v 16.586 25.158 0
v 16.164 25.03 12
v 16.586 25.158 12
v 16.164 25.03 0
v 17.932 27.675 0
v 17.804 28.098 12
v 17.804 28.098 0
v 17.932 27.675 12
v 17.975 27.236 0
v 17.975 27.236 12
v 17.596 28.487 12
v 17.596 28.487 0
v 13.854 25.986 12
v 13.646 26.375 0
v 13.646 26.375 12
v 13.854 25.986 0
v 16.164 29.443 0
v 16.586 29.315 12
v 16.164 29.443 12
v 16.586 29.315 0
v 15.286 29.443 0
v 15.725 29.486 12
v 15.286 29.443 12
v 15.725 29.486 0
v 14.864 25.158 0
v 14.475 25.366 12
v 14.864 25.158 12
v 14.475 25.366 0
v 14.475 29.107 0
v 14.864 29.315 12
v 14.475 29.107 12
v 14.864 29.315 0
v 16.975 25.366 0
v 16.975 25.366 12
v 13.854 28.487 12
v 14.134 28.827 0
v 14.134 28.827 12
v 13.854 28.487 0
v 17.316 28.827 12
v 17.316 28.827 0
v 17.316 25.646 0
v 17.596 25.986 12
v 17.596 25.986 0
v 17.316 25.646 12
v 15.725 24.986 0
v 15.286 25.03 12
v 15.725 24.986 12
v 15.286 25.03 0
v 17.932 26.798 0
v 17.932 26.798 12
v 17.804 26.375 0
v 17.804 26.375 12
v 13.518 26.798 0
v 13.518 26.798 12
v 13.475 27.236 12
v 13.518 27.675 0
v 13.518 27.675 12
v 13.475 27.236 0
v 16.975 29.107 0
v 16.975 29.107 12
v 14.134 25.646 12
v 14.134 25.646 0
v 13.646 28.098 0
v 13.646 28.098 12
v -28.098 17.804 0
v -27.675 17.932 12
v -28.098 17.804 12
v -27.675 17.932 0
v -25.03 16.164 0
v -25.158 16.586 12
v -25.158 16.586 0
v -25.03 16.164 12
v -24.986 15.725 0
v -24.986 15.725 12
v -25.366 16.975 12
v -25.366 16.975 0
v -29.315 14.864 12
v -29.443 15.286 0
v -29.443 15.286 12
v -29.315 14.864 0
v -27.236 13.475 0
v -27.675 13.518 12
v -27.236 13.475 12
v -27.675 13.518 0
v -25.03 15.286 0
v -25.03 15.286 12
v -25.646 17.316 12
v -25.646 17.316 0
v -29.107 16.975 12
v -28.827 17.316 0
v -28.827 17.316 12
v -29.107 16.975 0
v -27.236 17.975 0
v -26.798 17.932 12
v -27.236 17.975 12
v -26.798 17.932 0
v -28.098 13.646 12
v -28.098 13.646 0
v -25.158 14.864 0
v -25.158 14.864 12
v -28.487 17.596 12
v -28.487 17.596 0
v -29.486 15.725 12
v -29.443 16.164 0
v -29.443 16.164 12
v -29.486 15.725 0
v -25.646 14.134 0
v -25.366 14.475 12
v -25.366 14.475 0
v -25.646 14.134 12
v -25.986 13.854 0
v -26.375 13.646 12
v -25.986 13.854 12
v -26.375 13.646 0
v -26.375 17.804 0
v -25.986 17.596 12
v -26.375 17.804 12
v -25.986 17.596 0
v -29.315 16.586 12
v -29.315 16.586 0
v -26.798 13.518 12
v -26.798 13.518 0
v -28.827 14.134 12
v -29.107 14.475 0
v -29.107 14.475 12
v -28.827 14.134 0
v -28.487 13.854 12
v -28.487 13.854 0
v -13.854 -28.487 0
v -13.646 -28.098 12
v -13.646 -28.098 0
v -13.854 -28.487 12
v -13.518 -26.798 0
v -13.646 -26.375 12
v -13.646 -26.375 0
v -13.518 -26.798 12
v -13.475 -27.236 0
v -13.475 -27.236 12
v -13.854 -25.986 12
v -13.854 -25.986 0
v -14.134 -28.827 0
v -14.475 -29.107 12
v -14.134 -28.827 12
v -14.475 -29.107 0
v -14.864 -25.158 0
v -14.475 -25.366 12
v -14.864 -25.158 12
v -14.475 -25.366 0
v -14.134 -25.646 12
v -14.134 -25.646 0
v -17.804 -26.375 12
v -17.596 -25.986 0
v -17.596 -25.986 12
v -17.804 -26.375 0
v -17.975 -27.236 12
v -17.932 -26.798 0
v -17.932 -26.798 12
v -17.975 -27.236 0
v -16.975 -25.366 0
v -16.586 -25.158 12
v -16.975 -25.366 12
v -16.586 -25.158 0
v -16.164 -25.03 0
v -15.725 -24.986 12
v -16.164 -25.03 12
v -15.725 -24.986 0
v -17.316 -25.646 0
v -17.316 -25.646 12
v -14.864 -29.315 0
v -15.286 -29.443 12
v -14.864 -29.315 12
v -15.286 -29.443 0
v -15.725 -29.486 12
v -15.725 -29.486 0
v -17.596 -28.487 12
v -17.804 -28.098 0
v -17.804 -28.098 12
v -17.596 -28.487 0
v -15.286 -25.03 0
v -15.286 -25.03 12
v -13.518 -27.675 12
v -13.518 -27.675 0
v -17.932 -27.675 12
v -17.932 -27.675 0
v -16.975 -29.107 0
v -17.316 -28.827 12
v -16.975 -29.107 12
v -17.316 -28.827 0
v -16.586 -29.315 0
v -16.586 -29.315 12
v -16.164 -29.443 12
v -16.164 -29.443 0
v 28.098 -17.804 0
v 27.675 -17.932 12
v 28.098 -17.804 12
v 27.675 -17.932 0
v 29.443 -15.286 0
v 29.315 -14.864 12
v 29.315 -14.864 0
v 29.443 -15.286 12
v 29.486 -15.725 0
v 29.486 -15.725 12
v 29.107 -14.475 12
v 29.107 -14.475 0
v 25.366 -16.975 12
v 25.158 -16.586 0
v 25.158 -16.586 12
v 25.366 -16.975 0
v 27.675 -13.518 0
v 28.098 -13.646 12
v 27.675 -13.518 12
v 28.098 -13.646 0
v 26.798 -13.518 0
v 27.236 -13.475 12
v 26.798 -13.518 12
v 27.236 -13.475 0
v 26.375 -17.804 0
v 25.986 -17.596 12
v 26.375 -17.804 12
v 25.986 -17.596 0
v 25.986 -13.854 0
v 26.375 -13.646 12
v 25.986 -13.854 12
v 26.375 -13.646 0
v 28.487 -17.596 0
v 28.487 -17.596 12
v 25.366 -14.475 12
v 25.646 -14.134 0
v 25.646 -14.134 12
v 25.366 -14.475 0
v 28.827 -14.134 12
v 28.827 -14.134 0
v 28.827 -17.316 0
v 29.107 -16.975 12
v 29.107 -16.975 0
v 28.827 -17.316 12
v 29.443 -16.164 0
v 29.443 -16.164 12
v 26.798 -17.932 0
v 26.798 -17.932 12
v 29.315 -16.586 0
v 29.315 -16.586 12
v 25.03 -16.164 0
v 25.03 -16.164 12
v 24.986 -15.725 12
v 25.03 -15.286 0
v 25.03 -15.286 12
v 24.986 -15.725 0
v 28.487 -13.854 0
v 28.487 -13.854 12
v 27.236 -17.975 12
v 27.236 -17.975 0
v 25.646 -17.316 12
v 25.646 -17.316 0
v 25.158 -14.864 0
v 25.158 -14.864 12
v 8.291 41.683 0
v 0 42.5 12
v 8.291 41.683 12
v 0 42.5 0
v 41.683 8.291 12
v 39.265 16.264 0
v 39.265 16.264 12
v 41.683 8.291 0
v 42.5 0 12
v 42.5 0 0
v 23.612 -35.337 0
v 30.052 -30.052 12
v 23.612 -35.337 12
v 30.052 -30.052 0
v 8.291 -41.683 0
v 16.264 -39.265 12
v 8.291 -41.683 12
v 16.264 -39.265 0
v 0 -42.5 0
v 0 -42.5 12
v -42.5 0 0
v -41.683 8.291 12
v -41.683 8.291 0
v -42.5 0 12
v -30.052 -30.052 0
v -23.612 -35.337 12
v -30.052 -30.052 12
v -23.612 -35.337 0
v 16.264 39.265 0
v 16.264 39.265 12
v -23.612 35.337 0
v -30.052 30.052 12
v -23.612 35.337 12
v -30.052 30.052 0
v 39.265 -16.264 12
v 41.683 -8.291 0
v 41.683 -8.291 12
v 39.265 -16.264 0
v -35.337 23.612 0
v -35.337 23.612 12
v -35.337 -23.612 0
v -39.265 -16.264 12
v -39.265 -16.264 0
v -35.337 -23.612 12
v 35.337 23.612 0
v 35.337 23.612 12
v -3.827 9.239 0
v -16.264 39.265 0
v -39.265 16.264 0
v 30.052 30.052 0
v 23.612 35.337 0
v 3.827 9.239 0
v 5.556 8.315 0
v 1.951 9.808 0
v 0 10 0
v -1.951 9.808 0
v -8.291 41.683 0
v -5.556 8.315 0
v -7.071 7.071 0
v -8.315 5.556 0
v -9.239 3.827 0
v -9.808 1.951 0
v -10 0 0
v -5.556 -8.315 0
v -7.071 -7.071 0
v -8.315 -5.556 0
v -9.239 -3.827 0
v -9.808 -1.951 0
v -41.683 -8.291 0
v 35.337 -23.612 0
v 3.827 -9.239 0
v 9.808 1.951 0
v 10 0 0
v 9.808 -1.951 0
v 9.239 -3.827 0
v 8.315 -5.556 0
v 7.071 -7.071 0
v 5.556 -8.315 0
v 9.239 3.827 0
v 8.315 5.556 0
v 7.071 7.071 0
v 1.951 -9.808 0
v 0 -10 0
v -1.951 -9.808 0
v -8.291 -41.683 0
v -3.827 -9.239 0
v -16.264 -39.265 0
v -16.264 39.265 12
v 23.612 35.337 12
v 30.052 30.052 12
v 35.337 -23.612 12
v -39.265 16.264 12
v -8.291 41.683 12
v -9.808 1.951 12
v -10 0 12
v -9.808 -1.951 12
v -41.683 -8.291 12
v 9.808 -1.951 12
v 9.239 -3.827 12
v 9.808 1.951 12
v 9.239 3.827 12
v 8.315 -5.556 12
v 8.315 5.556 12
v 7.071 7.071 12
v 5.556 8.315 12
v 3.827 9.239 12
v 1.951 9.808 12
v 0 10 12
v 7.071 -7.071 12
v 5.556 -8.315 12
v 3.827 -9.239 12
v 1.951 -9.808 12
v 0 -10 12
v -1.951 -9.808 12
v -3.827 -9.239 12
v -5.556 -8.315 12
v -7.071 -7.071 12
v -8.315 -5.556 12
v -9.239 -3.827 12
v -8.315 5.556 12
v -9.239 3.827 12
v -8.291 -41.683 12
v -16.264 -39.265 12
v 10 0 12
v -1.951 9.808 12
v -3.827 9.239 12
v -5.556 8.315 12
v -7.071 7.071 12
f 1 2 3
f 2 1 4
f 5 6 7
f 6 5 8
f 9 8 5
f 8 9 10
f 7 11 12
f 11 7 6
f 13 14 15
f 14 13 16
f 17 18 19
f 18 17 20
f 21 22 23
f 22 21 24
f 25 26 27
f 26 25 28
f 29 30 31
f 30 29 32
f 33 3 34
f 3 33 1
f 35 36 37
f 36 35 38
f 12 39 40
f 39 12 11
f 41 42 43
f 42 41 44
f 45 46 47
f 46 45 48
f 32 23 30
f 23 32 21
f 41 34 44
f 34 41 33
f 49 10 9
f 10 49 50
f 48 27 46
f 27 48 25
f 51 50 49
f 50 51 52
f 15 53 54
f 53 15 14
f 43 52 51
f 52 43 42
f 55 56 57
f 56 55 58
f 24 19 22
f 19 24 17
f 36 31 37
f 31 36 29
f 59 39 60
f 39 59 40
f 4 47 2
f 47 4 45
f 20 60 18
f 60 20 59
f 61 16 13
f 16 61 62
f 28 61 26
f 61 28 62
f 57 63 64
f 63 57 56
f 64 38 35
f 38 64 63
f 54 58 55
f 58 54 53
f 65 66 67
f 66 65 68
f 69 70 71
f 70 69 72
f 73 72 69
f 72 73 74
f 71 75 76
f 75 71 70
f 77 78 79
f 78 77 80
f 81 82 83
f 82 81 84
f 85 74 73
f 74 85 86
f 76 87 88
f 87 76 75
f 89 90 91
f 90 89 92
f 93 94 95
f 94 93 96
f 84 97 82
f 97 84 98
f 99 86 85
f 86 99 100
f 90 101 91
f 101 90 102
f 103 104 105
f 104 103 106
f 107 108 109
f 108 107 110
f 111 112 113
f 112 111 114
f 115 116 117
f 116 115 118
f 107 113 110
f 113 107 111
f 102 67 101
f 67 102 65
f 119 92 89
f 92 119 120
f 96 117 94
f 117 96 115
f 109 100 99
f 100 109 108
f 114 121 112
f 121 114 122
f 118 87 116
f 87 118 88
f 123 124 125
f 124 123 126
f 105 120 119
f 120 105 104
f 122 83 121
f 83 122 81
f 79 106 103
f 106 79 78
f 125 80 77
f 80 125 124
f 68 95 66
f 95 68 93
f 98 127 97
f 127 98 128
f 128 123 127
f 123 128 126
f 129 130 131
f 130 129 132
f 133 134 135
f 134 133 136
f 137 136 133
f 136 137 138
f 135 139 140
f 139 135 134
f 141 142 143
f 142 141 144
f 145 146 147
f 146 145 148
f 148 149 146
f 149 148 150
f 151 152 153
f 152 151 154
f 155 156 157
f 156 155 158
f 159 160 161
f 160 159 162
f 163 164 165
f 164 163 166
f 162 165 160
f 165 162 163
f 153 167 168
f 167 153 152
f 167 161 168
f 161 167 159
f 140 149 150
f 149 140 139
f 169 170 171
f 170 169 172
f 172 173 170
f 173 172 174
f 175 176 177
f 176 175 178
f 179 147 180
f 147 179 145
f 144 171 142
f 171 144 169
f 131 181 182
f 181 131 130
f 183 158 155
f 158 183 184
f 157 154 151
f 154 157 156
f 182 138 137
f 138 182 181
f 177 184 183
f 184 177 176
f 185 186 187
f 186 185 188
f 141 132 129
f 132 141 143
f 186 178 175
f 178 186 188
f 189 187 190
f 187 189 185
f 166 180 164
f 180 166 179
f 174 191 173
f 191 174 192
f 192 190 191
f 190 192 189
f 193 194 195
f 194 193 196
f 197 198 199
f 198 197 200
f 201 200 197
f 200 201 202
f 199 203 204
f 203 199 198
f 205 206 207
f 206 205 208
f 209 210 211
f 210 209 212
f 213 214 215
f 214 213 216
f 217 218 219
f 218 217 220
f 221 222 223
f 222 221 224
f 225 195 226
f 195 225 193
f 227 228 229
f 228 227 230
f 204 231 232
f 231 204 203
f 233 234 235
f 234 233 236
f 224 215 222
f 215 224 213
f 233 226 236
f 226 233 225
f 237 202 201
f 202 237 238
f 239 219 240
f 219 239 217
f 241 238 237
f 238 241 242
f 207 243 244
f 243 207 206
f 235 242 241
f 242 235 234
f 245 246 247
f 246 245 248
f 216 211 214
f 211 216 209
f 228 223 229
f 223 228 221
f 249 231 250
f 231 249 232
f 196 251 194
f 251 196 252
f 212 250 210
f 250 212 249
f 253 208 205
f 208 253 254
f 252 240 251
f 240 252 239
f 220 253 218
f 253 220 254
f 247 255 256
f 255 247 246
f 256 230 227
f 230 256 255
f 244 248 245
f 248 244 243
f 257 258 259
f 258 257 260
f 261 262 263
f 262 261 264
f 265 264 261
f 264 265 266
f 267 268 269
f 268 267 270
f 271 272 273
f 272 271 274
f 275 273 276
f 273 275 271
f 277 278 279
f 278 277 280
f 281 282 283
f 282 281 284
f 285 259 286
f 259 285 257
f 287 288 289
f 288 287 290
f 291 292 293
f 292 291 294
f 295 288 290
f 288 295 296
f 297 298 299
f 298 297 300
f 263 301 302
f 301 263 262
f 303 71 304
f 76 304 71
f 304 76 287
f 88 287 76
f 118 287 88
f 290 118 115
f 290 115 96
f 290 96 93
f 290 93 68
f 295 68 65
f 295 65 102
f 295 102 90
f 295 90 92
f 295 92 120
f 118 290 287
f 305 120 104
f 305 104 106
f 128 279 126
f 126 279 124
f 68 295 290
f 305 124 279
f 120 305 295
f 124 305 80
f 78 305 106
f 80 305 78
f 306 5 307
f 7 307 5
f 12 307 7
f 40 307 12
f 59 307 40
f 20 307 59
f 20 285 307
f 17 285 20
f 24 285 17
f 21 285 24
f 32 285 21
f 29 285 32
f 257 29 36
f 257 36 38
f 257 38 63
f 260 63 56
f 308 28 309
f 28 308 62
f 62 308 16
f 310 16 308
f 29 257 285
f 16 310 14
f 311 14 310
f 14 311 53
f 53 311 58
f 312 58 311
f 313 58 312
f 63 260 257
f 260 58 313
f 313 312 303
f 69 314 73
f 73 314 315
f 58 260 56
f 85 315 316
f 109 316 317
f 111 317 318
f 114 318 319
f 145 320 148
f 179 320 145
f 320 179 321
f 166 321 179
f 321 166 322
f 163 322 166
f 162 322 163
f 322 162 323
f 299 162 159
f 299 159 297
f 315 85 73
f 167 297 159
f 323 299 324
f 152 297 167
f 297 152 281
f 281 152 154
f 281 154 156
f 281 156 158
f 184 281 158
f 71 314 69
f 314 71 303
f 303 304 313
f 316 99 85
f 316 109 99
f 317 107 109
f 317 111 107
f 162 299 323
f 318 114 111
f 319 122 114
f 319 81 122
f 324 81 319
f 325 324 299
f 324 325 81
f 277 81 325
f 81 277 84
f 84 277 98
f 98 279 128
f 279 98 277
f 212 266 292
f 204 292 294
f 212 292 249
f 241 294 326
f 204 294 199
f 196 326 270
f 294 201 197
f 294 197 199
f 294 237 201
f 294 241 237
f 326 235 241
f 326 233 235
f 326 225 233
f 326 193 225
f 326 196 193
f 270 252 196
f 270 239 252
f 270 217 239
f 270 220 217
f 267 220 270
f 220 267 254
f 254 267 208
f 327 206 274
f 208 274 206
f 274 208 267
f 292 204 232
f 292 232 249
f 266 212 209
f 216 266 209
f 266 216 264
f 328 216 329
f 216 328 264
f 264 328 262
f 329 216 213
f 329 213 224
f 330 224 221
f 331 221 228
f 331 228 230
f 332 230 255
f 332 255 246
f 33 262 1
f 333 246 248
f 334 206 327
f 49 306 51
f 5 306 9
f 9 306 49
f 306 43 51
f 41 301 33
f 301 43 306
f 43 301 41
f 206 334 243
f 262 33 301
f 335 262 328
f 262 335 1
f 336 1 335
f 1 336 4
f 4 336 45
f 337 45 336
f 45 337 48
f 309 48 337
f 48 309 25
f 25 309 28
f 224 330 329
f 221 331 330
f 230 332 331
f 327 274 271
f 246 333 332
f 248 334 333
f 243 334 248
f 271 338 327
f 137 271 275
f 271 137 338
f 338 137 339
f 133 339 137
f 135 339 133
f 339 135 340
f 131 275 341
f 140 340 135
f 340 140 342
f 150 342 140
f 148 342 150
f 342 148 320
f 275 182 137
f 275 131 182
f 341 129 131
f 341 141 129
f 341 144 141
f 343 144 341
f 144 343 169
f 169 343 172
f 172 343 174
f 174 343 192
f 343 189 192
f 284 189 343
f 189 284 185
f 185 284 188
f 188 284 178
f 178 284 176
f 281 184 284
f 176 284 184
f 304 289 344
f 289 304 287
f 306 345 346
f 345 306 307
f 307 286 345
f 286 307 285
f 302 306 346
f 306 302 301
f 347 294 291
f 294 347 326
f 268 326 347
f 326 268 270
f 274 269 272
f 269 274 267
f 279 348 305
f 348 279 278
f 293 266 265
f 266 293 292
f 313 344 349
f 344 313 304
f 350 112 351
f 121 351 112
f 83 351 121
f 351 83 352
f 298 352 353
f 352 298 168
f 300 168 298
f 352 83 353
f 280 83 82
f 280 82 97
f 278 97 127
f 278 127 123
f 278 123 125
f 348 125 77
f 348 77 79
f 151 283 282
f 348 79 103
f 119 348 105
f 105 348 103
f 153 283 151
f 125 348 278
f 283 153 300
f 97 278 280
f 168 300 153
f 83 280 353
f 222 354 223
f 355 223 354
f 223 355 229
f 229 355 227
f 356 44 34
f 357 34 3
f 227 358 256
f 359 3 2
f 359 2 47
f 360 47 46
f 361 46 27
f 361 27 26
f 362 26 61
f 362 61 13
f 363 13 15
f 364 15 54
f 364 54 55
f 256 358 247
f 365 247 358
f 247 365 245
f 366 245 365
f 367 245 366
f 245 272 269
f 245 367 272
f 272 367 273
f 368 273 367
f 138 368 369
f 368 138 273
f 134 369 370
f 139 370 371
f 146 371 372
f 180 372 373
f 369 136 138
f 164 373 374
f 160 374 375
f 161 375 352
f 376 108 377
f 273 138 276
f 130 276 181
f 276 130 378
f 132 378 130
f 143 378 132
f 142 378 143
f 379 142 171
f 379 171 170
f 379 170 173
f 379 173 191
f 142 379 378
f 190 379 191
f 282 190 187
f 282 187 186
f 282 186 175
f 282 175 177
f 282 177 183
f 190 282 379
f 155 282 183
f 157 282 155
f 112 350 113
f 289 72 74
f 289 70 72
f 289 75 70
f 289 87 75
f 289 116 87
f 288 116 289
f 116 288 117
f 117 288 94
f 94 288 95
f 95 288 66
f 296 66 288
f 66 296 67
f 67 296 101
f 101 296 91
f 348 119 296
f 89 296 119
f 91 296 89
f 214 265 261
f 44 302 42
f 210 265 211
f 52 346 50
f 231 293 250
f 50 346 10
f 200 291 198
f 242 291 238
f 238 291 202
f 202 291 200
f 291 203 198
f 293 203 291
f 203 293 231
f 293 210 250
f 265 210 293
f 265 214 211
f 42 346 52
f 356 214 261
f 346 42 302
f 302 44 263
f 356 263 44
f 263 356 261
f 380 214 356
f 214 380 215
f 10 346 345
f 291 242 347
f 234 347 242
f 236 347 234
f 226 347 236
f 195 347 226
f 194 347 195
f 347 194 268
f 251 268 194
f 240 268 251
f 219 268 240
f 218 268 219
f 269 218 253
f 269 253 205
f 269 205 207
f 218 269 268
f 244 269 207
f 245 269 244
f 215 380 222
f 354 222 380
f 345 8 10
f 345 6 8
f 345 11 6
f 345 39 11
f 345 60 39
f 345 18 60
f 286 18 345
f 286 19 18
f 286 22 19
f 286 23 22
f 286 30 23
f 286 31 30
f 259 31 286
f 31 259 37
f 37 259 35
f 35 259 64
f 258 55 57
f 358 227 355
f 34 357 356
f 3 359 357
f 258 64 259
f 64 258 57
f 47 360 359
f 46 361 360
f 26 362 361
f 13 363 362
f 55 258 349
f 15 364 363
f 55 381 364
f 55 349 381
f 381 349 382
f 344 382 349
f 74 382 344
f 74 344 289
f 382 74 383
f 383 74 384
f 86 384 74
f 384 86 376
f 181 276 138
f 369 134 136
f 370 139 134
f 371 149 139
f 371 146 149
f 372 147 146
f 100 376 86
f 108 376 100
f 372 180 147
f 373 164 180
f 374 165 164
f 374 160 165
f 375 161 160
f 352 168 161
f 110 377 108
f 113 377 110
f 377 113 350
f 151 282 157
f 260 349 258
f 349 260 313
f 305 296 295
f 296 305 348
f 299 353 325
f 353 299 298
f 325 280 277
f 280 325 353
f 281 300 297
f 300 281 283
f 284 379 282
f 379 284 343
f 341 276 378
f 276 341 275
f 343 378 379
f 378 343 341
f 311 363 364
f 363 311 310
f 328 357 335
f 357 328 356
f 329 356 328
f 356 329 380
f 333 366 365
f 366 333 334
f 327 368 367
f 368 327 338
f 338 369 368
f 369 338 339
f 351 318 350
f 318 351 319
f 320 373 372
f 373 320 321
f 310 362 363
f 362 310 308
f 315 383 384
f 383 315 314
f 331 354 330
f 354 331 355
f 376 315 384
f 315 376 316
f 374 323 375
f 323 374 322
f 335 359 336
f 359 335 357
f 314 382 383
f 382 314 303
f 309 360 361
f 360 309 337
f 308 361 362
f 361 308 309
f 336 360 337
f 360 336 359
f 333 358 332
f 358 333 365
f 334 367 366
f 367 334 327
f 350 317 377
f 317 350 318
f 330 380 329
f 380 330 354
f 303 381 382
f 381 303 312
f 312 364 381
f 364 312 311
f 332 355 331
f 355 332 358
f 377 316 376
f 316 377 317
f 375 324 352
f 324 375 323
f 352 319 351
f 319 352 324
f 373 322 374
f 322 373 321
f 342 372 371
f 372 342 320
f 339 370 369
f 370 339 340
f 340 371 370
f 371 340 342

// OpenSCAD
$fn = 32;

// ----------------------------------------------------------------------
// Flange Ø85 x 12
// 4 holes on a Ø62.9 bolt circle, bolted joints
// ----------------------------------------------------------------------

// --- parameters (mm) ---
flange_d = 85;   // outside diameter of the flange
thickness = 12;  // flange thickness
holes = 4;       // number of bolt holes
pcd = 62.9;      // bolt circle diameter
start_deg = 60;  // angle of the first hole, from +X
hole_d = 4.5;    // bolt hole diameter
bore_d = 20;     // central through bore
hub_d = 30;      // hub outside diameter
hub_h = 0;       // hub height above the flange face (0 = no hub)

// --- derived feature positions (mm) ---
height = thickness + hub_h;  // = 12   overall height of the part
pcd_r = pcd / 2;             // = 31.45   bolt circle radius
hole_step = 360 / holes;     // = 90   angular pitch
feature_centers = [
  [pcd_r * cos(start_deg + 0 * hole_step), pcd_r * sin(start_deg + 0 * hole_step)],
  [pcd_r * cos(start_deg + 1 * hole_step), pcd_r * sin(start_deg + 1 * hole_step)],
  [pcd_r * cos(start_deg + 2 * hole_step), pcd_r * sin(start_deg + 2 * hole_step)],
  [pcd_r * cos(start_deg + 3 * hole_step), pcd_r * sin(start_deg + 3 * hole_step)]
];   // bolt hole centres on the pitch circle

// flange disc, every hole and the bore cut straight through
difference() {
  union() {
    cylinder(d = flange_d, h = thickness);
  }
  translate([0, 0, -1]) cylinder(d = bore_d, h = height + 2);  // bore, through
  for (centre = feature_centers)
    translate([centre[0], centre[1], -1]) cylinder(d = hole_d, h = thickness + 2);
}
